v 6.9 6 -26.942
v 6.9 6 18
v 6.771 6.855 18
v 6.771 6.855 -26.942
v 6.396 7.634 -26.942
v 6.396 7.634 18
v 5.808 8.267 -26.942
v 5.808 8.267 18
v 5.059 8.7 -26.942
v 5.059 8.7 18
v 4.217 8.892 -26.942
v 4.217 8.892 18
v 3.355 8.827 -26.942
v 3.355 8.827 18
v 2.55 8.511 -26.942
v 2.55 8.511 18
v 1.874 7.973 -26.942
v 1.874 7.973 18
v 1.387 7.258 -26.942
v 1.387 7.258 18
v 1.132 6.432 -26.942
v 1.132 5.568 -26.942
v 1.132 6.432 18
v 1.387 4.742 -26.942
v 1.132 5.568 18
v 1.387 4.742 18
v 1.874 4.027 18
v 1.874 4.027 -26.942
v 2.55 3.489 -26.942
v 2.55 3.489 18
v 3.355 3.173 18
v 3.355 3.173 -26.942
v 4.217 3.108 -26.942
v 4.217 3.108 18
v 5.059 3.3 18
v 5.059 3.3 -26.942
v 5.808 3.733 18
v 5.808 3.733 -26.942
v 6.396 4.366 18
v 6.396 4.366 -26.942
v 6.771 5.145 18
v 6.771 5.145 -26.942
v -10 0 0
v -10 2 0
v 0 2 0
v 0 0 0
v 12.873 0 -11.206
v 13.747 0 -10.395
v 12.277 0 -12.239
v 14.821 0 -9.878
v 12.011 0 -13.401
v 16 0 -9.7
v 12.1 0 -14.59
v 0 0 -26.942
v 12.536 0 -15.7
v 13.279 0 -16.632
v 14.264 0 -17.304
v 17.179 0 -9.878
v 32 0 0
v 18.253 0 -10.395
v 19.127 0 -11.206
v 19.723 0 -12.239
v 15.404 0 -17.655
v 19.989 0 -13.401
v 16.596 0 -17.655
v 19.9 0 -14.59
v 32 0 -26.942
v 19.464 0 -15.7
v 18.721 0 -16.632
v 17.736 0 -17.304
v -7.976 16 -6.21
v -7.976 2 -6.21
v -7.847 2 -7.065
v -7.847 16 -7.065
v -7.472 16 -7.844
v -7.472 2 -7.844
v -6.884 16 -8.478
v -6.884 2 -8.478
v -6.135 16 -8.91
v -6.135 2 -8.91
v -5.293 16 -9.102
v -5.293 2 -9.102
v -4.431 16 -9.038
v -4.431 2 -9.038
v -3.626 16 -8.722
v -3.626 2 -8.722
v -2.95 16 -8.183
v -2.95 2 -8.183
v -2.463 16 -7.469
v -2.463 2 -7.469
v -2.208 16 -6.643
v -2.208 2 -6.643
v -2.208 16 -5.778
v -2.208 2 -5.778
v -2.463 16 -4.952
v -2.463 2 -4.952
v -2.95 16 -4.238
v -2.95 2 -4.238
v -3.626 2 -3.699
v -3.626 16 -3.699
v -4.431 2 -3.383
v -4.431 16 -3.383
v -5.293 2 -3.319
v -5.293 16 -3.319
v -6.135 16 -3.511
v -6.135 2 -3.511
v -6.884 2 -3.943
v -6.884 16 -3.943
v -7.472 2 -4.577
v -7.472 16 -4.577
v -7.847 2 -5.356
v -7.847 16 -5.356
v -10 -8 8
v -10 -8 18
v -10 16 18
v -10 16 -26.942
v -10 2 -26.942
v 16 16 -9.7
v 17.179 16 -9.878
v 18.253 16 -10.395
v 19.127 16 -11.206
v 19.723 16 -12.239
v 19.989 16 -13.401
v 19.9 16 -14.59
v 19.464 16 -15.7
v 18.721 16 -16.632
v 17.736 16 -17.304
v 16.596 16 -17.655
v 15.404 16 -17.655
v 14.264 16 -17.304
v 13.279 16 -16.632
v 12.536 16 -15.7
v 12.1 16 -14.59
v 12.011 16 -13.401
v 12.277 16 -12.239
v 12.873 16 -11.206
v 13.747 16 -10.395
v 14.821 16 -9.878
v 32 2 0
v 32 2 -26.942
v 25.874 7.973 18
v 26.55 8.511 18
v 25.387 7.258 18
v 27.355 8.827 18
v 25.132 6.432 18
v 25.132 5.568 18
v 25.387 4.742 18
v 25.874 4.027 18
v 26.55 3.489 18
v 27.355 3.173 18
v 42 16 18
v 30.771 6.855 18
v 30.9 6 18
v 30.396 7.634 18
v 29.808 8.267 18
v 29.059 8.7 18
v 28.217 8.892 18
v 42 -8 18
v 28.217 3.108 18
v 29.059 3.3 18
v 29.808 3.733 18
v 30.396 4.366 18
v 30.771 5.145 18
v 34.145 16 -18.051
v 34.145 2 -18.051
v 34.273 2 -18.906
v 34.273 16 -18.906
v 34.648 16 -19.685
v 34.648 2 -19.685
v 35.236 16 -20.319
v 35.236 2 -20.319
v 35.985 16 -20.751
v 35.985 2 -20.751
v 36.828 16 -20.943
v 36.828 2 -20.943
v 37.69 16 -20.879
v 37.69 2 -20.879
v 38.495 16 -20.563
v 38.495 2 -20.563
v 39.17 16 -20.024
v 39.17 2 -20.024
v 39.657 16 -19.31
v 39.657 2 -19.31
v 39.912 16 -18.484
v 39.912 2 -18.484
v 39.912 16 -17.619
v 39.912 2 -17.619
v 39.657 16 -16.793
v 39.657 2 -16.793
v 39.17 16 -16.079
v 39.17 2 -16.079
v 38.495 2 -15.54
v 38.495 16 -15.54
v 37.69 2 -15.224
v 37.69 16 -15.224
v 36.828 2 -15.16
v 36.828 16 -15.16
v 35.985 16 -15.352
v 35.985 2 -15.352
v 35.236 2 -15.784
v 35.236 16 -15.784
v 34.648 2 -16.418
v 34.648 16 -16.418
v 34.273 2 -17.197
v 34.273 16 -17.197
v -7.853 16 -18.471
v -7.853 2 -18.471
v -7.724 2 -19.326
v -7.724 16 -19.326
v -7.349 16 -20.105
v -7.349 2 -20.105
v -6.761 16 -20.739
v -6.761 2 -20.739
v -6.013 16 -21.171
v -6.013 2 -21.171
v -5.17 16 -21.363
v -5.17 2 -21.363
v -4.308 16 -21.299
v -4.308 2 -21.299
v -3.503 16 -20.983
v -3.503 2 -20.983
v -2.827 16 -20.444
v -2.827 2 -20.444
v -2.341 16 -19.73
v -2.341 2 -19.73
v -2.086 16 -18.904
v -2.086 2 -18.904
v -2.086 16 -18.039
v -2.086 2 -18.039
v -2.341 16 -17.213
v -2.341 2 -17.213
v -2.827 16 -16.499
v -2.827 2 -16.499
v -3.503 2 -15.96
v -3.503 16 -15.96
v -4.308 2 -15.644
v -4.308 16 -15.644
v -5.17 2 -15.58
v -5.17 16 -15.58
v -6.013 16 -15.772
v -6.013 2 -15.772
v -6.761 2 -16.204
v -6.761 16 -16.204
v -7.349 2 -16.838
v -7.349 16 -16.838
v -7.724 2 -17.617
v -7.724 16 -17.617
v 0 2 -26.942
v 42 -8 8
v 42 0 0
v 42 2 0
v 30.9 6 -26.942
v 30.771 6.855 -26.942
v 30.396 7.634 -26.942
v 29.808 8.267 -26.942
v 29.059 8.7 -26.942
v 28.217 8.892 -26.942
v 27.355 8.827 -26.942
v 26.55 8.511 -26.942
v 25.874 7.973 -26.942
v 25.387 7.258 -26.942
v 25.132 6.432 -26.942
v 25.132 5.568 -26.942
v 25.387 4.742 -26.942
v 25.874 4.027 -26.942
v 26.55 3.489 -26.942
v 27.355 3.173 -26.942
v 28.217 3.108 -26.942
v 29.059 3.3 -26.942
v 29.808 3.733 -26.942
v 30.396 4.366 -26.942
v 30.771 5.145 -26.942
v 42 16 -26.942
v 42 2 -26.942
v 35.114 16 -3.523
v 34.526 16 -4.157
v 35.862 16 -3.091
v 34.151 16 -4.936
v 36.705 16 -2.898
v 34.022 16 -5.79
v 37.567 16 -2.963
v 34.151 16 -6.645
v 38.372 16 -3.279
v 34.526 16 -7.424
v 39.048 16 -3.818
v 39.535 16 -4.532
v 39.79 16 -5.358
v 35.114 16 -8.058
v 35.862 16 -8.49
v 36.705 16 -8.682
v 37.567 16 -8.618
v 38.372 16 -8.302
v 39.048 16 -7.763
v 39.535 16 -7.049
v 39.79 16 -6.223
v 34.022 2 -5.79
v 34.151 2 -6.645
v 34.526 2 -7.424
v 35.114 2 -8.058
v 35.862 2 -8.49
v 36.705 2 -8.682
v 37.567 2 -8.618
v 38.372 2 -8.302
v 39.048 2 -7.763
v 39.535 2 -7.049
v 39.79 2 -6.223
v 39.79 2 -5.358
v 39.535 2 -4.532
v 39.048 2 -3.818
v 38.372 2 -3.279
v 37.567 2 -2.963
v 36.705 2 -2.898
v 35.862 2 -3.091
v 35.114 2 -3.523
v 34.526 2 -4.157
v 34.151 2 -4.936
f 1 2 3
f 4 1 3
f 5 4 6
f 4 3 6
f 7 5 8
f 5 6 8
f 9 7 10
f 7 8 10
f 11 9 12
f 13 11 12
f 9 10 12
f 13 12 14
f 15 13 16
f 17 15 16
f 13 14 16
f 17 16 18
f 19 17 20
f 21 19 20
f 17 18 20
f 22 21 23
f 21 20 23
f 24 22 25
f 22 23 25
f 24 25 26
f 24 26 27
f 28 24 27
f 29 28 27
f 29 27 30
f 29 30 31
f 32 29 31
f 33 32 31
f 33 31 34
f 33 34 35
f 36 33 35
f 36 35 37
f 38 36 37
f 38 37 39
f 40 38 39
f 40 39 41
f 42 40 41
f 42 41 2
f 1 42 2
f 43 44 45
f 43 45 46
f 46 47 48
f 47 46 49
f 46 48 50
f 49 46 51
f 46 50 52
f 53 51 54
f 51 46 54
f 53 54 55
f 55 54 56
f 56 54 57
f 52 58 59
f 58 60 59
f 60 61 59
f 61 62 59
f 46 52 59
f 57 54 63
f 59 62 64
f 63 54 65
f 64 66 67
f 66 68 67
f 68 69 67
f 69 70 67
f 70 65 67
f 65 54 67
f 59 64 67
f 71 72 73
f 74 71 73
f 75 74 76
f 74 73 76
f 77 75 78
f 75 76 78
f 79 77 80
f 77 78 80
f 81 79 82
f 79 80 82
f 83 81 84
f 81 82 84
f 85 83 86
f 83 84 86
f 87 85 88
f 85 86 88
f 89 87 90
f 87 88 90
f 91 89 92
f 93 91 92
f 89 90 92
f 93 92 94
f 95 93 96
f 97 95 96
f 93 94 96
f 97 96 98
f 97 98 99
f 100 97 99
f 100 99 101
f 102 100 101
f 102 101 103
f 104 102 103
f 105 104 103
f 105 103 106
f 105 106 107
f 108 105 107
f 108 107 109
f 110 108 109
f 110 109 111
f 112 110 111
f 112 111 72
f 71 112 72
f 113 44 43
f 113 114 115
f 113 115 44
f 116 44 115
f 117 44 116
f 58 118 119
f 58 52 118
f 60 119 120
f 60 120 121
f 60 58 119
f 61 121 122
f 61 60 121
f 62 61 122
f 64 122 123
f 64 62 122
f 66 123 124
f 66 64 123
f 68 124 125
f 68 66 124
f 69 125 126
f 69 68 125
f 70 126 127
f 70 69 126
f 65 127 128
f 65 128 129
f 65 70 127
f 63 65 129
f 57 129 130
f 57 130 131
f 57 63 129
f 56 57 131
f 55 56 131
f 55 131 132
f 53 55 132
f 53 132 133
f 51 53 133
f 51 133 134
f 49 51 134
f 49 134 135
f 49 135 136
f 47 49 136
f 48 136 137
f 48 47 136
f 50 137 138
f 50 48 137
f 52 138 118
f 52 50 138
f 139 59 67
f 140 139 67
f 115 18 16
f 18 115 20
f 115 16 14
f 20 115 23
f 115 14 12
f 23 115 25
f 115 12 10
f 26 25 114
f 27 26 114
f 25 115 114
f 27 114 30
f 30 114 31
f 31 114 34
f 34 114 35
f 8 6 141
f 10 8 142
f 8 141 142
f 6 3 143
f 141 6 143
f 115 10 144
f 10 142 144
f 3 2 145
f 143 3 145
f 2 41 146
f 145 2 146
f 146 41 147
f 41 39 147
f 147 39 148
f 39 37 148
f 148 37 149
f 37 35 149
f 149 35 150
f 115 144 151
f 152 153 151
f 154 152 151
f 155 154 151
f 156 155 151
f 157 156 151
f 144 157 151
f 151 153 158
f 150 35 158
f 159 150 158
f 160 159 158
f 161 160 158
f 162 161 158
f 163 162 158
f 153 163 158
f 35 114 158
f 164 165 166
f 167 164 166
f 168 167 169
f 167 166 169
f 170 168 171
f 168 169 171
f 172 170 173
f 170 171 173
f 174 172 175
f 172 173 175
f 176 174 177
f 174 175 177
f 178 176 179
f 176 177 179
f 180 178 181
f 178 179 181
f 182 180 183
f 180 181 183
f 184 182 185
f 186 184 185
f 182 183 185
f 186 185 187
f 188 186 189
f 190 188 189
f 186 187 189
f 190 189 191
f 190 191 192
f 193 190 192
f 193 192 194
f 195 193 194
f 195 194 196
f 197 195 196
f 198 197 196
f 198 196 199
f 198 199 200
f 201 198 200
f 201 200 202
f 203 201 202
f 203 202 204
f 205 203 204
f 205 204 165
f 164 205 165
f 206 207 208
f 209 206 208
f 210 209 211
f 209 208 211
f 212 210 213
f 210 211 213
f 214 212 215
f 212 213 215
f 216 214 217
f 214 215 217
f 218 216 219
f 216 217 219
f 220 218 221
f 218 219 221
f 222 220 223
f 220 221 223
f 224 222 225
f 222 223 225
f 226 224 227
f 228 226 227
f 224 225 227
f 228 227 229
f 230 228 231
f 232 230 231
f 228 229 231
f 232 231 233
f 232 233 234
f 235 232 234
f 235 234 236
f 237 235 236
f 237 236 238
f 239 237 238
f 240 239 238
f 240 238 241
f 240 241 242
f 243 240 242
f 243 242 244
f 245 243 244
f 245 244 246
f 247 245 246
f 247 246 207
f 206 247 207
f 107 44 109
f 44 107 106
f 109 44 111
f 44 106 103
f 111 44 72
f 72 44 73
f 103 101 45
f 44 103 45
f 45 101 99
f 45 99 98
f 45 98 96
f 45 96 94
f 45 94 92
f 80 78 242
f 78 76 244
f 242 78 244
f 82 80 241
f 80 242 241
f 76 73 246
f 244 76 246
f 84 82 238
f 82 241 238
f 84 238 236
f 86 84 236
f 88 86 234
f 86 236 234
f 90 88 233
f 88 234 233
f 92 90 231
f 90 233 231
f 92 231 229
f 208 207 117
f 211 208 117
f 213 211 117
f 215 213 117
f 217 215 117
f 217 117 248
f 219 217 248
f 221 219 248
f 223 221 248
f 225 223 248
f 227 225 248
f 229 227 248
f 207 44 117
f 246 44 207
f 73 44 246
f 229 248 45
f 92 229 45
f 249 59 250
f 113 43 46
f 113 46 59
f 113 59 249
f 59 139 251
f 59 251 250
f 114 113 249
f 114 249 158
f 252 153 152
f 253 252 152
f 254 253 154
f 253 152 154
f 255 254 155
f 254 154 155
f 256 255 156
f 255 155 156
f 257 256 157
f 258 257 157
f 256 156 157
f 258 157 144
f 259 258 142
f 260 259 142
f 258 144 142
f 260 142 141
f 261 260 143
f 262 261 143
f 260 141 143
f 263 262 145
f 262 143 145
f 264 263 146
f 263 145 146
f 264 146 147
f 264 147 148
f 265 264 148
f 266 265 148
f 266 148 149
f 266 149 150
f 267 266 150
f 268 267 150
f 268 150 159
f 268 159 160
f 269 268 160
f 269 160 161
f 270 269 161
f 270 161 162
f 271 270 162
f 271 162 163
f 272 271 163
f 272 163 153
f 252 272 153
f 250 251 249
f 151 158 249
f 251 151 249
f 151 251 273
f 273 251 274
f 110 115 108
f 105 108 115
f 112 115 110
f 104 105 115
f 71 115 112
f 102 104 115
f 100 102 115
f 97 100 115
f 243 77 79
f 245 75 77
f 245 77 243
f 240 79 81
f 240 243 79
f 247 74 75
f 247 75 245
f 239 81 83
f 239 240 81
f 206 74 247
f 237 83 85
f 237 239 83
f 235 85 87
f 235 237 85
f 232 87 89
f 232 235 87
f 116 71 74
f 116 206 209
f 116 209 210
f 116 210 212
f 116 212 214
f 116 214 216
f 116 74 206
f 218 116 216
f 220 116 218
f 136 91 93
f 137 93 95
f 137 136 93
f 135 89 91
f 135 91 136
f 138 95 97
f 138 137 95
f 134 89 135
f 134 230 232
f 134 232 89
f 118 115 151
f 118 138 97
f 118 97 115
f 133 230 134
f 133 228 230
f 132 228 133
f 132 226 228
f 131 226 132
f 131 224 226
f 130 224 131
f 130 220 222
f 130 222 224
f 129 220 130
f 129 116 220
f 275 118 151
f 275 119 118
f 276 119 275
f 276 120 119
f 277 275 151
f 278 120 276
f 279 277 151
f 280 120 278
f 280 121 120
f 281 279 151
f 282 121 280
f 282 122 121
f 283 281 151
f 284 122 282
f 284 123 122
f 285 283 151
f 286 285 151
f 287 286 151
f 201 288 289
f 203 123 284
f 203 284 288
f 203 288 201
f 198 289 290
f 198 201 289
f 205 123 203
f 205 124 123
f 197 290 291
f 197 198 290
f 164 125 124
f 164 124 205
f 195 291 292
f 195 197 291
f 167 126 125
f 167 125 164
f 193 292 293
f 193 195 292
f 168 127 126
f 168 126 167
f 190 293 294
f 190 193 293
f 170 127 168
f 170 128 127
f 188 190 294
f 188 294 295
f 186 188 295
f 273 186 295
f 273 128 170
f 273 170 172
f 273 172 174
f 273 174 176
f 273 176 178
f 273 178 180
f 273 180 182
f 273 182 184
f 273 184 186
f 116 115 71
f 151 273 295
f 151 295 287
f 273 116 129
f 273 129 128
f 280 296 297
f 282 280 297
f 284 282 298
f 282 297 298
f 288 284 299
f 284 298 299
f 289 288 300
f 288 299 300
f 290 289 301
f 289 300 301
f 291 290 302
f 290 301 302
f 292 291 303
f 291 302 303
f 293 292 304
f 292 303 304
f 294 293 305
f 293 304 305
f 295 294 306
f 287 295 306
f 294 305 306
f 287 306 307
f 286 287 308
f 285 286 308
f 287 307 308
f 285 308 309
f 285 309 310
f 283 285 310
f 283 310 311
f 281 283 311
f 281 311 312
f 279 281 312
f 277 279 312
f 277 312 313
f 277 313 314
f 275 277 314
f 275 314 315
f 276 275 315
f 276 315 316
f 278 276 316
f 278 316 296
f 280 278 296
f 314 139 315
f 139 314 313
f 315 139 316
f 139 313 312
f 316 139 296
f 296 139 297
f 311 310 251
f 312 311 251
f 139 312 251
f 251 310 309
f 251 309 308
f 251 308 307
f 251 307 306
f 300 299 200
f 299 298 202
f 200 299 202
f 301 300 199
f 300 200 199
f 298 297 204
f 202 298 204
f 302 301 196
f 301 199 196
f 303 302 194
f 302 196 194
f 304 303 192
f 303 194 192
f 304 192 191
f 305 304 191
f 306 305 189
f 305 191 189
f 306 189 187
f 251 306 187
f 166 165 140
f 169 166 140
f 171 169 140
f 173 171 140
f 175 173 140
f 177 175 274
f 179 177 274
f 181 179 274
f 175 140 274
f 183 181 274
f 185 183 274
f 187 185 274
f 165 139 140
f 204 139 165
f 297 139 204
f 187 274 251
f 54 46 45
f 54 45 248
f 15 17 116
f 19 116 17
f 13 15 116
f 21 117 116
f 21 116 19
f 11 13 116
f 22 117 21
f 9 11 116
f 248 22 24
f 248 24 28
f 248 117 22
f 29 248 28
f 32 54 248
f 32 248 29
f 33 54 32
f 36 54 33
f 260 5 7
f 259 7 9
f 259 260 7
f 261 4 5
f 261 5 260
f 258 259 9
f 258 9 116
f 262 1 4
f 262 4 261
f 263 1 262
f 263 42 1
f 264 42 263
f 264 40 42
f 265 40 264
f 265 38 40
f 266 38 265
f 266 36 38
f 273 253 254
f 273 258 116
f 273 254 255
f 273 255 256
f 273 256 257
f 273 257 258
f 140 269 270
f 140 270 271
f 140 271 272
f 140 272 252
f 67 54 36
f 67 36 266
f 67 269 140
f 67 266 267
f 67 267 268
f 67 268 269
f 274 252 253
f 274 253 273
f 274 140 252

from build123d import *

# Parameters (mm, degrees)
SKETCH1_W            = 32
SKETCH1_H            = 26.941935484
SKETCH1_R            = 4
BOSS_EXTRUDE1_DEPTH  = 10
SKETCH2_W            = 10
SKETCH2_H            = 26.941935484
BOSS_EXTRUDE2_DEPTH  = 8
BOSS_EXTRUDE3_REACH  = 61.413
M5_CLEARANCE_HOLE1_D = 5.8
SKETCH6_W            = 52
SKETCH6_H            = 44.941935484
SKETCH6_R            = 4
BOSS_EXTRUDE4_DEPTH  = 6
M5_CLEARANCE_HOLE2_D = 5.8


with BuildPart() as part:
    # Sketch1 → Boss-Extrude1 (new body)
    with BuildSketch(Plane(origin=(0, 0, 0), x_dir=(1, 0, 0), z_dir=(0, 1, 0))):
        with Locations((16, 13.470967742)):
            Rectangle(SKETCH1_W, SKETCH1_H)
        with Locations(Location((16, 13.7, 0), (0, 0, 270))):
            Circle(SKETCH1_R, mode=Mode.SUBTRACT)
    extrude(amount=BOSS_EXTRUDE1_DEPTH)

    # Sketch2 → Boss-Extrude2 (add)
    with BuildSketch(Plane(origin=(0, 10, 0), x_dir=(1, 0, 0), z_dir=(0, 1, 0))):
        with Locations((-5, 13.470967742)):
            Rectangle(SKETCH2_W, SKETCH2_H)
        with Locations((37, 13.470967742)):
            Rectangle(SKETCH2_W, SKETCH2_H)
    extrude(amount=-BOSS_EXTRUDE2_DEPTH)

    # Boss-Extrude3: up to this face of the body (flat: up to its plane)
    boss_extrude3_end = Plane(part.part.faces().sort_by_distance((42, 6, -13.470967742))[0])
    # Sketch3 → Boss-Extrude3 (add, up to the picked face)
    with BuildSketch(Plane.ZY.offset(10), mode=Mode.PRIVATE) as boss_extrude3_sk1:
        Polygon((0, 0), (8, -8), (18, -8), (18, 10), (0, 10), align=None)
    boss_extrude3_tool1 = split(extrude(boss_extrude3_sk1.sketch, amount=-BOSS_EXTRUDE3_REACH, mode=Mode.PRIVATE), bisect_by=boss_extrude3_end, keep=Keep.BOTH, mode=Mode.PRIVATE)
    add(boss_extrude3_tool1.solids().sort_by(Axis((-10, 1.694064, 9.694064), (1, 0, 0)))[0])

    # M5 Clearance Hole1 (through all)
    with Locations(Plane(origin=(0, 0, -26.941935484), x_dir=(-1, 0, 0), z_dir=(0, 0, -1))):
        with Locations((-28, 6), (-4, 6)):
            Hole(M5_CLEARANCE_HOLE1_D / 2)

    # Sketch6 → Boss-Extrude4 (add)
    with BuildSketch(Plane(origin=(0, 10, 0), x_dir=(1, 0, 0), z_dir=(0, 1, 0))):
        with Locations((16, 4.470967742)):
            Rectangle(SKETCH6_W, SKETCH6_H)
        with Locations(Location((16, 13.7, 0), (0, 0, 270))):
            Circle(SKETCH6_R, mode=Mode.SUBTRACT)
    extrude(amount=BOSS_EXTRUDE4_DEPTH)

    # M5 Clearance Hole2 (through all)
    with Locations(Plane(origin=(0, 16, 0), x_dir=(1, 0, 0), z_dir=(0, 1, 0))):
        with Locations((37.04456925, 18.051391355), (36.92194463, 5.790370874), (-4.953330413, 18.47141973), (-5.075955034, 6.210399249)):
            Hole(M5_CLEARANCE_HOLE2_D / 2)


solid = part.part
